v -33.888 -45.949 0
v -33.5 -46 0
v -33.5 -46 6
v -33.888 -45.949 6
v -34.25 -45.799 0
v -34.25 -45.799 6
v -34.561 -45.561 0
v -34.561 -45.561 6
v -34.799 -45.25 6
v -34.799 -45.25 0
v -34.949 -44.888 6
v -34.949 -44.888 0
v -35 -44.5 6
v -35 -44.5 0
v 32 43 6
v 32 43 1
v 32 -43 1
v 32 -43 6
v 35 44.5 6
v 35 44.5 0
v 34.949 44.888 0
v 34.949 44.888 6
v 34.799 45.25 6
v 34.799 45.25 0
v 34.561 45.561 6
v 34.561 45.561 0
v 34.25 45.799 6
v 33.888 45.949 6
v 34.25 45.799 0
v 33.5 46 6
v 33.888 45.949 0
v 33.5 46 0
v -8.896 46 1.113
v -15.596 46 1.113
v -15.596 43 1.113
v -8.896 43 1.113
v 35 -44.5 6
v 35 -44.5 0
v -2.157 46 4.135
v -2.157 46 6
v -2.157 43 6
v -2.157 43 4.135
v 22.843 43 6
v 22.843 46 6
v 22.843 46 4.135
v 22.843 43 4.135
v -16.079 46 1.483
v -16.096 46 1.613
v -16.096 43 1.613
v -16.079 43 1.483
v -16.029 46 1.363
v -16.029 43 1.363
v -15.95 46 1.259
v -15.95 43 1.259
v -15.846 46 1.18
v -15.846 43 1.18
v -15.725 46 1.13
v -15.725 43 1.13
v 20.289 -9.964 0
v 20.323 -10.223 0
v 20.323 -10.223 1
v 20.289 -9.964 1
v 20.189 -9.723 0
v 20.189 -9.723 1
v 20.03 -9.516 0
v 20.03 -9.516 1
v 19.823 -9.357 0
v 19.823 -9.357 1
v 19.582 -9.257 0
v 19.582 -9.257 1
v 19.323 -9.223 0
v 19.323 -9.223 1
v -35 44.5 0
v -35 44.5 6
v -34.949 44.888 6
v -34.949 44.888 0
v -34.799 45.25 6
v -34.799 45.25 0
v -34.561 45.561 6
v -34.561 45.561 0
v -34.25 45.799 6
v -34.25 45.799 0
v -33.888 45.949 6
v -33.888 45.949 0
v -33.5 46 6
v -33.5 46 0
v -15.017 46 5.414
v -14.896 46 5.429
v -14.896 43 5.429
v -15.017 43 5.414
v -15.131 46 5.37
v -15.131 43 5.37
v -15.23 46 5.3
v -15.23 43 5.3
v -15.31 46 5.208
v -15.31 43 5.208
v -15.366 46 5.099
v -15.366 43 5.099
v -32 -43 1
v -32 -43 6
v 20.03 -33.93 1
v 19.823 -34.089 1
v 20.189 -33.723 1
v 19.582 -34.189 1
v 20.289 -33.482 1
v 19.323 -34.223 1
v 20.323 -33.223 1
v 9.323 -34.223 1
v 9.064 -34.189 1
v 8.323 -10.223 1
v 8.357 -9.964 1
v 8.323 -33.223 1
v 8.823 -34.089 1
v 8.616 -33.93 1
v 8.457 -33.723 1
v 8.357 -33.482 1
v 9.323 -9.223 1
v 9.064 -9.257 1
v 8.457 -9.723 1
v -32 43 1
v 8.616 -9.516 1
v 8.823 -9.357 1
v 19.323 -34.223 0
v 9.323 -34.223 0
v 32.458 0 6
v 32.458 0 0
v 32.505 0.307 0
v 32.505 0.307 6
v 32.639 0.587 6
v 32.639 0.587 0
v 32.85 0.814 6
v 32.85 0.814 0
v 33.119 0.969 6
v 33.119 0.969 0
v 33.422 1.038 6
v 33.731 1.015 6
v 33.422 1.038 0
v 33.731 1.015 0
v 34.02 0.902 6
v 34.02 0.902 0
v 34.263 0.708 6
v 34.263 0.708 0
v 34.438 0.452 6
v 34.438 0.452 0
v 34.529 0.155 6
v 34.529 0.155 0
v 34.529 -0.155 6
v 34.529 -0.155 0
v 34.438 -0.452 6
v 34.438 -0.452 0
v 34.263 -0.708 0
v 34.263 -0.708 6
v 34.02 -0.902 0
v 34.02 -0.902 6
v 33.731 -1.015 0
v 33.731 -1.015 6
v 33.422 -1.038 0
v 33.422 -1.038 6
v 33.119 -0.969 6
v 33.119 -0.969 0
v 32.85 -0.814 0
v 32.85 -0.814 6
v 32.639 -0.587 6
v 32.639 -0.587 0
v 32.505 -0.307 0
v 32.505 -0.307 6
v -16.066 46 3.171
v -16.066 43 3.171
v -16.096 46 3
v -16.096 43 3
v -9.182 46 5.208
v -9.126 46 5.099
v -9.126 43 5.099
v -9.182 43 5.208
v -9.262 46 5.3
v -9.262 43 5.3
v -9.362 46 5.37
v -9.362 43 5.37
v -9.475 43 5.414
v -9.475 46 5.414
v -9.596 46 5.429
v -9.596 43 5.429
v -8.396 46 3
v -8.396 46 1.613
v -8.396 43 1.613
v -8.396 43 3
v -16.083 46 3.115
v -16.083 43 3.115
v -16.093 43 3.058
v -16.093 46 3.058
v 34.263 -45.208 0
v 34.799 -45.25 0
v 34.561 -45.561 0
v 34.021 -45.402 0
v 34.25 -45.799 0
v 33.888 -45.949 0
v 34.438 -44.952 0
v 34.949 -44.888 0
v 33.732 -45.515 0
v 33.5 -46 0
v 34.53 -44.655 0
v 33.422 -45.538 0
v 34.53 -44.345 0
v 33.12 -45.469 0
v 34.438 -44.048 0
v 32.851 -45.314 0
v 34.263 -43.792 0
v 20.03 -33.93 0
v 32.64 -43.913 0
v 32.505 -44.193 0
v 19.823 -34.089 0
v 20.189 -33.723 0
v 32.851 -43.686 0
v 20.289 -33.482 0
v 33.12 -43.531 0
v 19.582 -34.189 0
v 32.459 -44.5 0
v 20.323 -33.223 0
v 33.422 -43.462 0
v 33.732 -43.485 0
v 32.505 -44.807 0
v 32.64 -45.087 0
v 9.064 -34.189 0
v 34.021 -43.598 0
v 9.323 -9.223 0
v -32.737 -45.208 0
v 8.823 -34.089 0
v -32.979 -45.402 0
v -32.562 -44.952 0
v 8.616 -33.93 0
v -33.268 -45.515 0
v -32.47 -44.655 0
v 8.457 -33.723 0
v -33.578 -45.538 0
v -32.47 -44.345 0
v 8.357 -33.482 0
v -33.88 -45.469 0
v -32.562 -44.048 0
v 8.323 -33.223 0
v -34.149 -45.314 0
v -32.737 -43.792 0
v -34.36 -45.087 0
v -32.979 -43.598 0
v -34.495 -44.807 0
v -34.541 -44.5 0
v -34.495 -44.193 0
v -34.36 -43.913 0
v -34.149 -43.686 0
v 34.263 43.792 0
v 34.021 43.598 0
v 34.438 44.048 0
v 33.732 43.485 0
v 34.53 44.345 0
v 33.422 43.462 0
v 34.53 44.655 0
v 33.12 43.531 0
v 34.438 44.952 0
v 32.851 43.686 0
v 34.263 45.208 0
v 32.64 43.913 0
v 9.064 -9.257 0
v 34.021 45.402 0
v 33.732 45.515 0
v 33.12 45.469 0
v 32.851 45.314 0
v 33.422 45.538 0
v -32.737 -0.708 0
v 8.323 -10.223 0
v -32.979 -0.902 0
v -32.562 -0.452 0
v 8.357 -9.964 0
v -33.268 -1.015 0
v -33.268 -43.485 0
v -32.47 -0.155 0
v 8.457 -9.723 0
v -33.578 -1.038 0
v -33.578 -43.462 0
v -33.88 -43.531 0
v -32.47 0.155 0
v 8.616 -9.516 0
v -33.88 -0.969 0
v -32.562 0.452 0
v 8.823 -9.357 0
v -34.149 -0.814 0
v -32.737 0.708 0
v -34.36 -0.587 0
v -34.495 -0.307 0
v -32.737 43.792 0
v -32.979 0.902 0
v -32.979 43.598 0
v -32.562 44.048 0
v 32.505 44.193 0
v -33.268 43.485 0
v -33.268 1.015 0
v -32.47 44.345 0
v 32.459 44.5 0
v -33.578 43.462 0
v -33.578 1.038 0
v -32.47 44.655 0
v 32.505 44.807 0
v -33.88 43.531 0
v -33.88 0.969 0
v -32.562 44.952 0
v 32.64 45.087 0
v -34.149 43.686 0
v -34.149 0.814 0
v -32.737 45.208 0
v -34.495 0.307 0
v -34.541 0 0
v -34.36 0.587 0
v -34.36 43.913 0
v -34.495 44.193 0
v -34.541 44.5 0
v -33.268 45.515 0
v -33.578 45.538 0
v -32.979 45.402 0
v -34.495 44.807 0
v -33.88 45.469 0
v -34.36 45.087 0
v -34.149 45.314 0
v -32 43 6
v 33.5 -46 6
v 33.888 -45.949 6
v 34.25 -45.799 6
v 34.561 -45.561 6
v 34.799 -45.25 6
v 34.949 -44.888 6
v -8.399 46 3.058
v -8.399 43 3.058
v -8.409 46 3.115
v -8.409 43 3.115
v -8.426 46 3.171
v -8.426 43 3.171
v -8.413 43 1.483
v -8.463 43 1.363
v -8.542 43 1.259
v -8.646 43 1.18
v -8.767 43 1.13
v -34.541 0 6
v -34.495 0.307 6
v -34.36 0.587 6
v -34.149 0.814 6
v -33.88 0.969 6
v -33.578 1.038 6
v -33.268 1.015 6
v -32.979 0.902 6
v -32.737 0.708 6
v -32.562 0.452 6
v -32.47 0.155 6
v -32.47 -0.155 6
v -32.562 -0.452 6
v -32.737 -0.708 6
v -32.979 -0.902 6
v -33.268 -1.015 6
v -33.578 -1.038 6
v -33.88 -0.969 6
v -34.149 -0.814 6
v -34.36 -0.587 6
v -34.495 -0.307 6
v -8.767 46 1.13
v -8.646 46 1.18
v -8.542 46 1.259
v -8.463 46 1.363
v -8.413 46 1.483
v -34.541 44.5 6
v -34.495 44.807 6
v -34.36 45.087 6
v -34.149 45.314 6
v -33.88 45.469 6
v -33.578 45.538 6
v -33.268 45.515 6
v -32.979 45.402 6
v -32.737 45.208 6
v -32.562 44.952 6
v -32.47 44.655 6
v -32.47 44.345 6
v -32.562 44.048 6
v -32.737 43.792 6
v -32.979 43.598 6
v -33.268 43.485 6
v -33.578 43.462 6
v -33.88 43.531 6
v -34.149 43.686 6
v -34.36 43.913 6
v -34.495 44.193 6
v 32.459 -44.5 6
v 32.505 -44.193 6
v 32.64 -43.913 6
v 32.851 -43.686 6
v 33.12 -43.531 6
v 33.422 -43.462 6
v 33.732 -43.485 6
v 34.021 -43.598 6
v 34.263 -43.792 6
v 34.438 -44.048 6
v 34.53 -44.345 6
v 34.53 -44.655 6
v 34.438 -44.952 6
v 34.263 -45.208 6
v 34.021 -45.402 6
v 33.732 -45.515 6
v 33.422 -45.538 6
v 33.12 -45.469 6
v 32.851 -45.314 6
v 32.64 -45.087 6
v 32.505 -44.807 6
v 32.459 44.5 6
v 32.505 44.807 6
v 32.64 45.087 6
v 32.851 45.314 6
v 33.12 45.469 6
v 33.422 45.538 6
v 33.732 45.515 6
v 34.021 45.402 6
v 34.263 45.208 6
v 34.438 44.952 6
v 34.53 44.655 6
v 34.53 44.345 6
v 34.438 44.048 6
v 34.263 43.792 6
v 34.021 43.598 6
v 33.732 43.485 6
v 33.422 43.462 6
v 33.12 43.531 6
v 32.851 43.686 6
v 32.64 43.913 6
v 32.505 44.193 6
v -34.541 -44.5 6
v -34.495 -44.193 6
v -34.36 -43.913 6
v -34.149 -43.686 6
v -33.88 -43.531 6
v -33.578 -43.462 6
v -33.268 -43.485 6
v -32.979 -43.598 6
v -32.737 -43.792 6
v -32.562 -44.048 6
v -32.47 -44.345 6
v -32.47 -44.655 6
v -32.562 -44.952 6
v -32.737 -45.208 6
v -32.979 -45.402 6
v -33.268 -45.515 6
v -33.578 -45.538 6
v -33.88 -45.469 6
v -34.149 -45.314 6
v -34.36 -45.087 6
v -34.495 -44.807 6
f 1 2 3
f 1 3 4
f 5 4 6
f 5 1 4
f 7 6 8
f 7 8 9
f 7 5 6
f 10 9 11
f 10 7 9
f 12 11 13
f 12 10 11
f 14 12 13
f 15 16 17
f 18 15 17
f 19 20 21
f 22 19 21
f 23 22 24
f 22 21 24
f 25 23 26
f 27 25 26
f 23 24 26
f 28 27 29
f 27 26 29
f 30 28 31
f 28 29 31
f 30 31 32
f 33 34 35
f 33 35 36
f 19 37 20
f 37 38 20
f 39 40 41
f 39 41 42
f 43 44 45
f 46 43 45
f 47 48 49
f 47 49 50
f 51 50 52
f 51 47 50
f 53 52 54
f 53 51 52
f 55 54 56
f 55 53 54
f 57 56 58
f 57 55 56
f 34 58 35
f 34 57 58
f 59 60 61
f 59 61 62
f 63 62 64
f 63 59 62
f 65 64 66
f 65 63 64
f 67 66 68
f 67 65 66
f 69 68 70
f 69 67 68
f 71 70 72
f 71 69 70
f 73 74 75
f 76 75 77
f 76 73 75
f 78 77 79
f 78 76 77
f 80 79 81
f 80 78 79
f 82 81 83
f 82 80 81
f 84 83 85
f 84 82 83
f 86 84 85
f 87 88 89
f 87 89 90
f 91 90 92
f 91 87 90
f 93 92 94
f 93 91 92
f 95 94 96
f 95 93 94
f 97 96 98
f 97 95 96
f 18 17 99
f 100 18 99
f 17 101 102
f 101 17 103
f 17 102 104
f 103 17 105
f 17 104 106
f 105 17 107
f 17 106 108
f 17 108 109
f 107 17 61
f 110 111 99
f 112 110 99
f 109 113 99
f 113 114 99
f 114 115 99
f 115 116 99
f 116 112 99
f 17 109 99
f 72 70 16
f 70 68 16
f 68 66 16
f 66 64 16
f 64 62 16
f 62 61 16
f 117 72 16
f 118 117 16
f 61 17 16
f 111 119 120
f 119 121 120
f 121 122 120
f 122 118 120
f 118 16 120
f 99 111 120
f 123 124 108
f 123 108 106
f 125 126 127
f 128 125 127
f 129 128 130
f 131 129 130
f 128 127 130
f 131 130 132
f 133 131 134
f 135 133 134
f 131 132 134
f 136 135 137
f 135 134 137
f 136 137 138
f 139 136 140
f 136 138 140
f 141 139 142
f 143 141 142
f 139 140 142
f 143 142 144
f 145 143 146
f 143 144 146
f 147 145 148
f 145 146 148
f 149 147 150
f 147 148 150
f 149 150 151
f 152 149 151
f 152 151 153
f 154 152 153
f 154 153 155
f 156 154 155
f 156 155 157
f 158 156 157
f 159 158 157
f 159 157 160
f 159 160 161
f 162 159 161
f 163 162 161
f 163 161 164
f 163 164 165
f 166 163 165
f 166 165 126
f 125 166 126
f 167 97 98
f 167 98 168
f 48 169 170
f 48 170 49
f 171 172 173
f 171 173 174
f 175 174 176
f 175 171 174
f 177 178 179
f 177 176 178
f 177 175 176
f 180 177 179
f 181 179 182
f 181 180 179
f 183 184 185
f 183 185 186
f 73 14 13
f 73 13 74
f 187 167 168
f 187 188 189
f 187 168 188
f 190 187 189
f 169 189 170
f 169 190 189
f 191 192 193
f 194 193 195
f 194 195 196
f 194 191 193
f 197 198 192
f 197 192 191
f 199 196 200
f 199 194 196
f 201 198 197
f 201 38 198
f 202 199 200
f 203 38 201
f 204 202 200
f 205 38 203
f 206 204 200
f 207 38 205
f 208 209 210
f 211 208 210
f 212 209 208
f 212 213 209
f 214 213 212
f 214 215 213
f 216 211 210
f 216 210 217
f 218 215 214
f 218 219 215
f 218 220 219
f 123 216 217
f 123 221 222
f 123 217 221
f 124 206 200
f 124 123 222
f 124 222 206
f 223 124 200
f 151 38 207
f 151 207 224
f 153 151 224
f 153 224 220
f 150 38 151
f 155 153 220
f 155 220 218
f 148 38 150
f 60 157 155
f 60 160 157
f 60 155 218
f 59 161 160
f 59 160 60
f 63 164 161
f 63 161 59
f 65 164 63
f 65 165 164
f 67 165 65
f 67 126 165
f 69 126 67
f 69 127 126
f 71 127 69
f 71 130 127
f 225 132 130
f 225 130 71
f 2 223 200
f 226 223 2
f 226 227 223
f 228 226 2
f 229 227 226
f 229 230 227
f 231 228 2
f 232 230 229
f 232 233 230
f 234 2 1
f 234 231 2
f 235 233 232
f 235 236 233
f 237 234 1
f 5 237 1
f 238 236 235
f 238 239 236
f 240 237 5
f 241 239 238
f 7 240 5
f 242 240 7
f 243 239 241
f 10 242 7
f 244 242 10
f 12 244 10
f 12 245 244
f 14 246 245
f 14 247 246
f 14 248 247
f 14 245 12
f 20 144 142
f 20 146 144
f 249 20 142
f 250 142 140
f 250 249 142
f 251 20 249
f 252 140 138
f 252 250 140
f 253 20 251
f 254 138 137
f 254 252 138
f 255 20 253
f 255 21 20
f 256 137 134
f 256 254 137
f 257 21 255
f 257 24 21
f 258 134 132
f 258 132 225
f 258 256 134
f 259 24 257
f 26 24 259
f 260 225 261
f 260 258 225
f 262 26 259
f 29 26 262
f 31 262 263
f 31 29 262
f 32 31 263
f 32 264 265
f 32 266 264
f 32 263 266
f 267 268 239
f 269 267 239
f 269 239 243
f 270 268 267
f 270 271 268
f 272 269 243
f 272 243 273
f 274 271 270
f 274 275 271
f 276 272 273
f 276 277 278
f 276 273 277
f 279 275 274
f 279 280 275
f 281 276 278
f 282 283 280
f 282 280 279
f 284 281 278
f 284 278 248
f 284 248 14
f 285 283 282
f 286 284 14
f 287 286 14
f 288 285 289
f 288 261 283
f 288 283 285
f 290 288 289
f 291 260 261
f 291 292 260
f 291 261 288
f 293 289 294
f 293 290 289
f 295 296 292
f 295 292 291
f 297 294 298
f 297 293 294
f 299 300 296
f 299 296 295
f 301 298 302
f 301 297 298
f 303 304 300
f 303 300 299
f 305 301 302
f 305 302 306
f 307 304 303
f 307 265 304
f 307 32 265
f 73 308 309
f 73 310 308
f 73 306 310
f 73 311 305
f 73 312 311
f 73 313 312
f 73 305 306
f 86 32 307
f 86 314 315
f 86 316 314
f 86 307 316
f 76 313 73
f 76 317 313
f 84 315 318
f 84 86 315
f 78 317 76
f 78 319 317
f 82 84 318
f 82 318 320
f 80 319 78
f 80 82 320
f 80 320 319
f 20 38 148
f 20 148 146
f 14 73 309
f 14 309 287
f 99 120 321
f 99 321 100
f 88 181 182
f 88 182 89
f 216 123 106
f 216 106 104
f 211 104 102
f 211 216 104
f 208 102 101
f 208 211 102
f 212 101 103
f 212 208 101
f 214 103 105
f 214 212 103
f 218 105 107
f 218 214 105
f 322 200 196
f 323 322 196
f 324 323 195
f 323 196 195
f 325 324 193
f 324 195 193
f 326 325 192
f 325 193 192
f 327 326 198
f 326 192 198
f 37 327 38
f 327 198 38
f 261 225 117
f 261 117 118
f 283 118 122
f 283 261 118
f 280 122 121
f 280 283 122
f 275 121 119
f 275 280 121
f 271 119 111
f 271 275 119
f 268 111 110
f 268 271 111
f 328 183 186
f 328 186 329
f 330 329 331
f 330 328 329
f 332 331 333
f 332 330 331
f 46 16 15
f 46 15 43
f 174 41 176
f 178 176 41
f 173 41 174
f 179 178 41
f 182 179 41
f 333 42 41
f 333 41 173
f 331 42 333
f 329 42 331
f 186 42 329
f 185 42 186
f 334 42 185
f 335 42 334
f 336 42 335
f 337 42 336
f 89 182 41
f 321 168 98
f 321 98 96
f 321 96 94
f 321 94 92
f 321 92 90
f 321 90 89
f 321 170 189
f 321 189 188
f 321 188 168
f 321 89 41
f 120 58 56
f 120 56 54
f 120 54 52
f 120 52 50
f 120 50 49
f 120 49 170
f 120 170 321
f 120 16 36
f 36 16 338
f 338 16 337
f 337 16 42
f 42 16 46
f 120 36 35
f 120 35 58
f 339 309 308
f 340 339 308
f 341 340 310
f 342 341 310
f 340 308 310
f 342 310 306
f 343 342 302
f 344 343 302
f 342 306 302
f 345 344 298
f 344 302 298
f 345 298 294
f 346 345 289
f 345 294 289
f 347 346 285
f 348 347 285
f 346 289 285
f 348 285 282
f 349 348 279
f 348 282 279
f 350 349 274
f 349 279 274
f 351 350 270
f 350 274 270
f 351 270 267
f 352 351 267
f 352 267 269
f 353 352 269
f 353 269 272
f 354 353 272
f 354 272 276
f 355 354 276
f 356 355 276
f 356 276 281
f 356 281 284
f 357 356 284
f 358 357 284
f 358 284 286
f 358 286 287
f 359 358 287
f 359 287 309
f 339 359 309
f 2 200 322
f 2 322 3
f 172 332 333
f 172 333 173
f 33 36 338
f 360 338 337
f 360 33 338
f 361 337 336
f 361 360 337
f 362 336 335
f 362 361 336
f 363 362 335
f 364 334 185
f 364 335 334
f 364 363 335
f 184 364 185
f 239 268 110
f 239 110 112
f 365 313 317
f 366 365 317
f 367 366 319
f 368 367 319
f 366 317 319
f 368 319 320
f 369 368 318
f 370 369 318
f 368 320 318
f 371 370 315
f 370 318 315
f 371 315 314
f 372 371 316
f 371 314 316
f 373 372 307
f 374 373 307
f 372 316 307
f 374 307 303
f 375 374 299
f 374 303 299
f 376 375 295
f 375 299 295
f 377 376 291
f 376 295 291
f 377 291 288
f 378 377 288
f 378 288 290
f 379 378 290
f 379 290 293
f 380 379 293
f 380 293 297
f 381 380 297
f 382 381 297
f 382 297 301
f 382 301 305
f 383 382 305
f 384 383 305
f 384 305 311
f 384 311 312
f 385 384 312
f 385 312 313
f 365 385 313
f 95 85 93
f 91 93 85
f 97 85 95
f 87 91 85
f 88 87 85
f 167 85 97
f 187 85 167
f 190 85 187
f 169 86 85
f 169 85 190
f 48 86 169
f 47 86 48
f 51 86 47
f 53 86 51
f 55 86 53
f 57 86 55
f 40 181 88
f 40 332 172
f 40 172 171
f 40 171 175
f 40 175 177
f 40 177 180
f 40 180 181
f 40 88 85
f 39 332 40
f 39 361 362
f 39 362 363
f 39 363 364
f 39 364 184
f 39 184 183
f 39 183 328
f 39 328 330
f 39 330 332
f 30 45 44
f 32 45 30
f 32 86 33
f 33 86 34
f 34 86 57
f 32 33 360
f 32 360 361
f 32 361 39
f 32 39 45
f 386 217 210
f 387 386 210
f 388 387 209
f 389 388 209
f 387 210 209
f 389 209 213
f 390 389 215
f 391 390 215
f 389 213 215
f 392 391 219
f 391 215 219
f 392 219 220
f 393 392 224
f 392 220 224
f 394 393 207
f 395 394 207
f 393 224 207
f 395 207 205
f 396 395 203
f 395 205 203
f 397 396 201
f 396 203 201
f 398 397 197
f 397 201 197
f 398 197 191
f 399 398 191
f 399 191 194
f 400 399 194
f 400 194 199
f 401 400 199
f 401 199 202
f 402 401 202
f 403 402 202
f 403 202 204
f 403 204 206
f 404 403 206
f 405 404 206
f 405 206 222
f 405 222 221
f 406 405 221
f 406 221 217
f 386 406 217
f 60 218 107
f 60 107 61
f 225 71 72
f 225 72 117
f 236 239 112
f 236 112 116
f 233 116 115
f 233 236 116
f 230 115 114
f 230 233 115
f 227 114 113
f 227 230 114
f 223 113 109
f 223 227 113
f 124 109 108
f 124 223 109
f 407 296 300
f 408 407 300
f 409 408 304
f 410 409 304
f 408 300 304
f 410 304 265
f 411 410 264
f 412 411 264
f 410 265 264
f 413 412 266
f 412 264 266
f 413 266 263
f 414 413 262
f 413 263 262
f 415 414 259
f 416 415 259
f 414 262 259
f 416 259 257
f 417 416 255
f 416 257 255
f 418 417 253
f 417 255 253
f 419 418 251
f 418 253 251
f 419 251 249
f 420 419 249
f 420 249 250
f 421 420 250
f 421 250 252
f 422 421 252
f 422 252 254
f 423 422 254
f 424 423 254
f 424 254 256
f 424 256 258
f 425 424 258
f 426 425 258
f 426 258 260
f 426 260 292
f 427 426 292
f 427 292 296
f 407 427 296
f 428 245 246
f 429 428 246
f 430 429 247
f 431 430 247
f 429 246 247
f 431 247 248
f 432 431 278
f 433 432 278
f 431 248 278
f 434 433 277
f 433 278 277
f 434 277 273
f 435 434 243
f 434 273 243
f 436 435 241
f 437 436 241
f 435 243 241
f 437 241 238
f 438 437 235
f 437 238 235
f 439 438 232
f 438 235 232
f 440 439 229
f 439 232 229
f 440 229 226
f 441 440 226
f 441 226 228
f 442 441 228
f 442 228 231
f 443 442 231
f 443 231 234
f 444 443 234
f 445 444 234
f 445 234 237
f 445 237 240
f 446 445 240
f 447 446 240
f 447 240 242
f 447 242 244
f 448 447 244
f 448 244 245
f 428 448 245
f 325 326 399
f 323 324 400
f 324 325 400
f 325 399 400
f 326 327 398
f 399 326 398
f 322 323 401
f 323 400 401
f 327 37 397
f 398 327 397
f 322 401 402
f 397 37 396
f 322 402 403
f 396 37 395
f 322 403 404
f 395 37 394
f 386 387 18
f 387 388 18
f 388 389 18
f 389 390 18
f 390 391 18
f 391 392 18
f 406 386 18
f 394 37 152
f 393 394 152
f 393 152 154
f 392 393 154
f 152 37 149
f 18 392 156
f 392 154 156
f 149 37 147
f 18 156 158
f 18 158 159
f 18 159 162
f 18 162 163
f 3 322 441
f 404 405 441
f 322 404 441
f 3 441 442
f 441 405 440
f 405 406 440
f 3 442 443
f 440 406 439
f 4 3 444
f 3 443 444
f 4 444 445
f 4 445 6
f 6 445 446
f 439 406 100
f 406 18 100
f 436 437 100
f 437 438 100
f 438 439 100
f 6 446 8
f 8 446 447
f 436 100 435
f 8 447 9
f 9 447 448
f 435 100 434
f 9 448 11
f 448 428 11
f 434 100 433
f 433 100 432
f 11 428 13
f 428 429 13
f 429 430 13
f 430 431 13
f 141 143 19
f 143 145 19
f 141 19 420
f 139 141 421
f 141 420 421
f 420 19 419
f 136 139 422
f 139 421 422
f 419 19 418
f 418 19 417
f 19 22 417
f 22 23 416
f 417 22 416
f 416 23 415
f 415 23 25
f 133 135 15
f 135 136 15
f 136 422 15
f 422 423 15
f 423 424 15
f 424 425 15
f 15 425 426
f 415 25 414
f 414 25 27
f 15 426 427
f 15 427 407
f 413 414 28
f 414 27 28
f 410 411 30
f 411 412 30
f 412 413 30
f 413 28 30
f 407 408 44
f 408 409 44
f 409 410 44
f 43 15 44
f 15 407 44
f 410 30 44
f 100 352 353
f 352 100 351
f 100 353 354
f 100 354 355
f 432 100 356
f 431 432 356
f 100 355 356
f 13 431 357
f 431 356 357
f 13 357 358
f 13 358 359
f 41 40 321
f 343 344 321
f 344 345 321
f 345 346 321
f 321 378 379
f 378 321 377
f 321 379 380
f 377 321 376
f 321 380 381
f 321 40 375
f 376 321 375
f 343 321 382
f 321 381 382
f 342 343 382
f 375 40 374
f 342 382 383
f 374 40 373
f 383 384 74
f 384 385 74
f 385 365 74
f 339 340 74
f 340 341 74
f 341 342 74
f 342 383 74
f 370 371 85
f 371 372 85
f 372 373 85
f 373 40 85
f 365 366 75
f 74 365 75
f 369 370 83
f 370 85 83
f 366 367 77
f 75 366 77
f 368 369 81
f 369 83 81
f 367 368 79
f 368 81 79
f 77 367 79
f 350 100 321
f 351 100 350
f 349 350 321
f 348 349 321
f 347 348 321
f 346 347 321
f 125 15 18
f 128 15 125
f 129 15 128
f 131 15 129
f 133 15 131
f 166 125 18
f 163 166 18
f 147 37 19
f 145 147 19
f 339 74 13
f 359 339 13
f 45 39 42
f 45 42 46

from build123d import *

# Parameters (mm, degrees)
BOSS_EXTRUDE1_DEPTH       = 1
BOSS_EXTRUDE2_DEPTH       = 5
BOSS_EXTRUDE3_DEPTH       = 5
CUT_EXTRUDE3_DEPTH        = 10
CUT_EXTRUDE2_DEPTH        = 10
TAP_DRILL_FOR_3_56_TAP1_D = 2.0828
SKETCH29_W                = 25
SKETCH29_H                = 1.864988104
CUT_EXTRUDE4_DEPTH        = 10


with BuildPart() as part:
    # Sketch2 → Boss-Extrude1 (new body)
    with BuildSketch(Plane.XY):
        with BuildLine():
            Line((-33.5, 46), (33.5, 46))
            ThreePointArc((33.5, 46), (34.560660172, 45.560660172), (35, 44.5))
            Line((35, 44.5), (35, -44.5))
            ThreePointArc((35, -44.5), (34.560660172, -45.560660172), (33.5, -46))
            Line((33.5, -46), (-33.5, -46))
            ThreePointArc((-33.5, -46), (-34.560660172, -45.560660172), (-35, -44.5))
            Line((-35, -44.5), (-35, 44.5))
            ThreePointArc((-35, 44.5), (-34.560660172, 45.560660172), (-33.5, 46))
        make_face()
    extrude(amount=BOSS_EXTRUDE1_DEPTH)

    # Sketch3 → Boss-Extrude2 (add)
    with BuildSketch(Plane.XY.offset(1)):
        with BuildLine():
            Line((-32, 44.5), (-32, -44.5))
            ThreePointArc((-32, -44.5), (-33.5, -46), (-35, -44.5))
            Line((-35, -44.5), (-35, 44.5))
            ThreePointArc((-35, 44.5), (-33.5, 46), (-32, 44.5))
        make_face()
        with BuildLine():
            Line((32, 44.5), (32, -44.5))
            ThreePointArc((32, -44.5), (33.5, -46), (35, -44.5))
            Line((35, -44.5), (35, 44.5))
            ThreePointArc((35, 44.5), (33.5, 46), (32, 44.5))
        make_face()
    extrude(amount=BOSS_EXTRUDE2_DEPTH)

    # Sketch4 → Boss-Extrude3 (add)
    with BuildSketch(Plane.XY.offset(1)):
        with BuildLine():
            Line((-33.5, 46), (33.5, 46))
            ThreePointArc((33.5, 46), (35, 44.5), (33.5, 43))
            Line((33.5, 43), (-33.5, 43))
            ThreePointArc((-33.5, 43), (-35, 44.5), (-33.5, 46))
        make_face()
        with BuildLine():
            Line((-33.5, -46), (33.5, -46))
            ThreePointArc((33.5, -46), (35, -44.5), (33.5, -43))
            Line((33.5, -43), (-33.5, -43))
            ThreePointArc((-33.5, -43), (-35, -44.5), (-33.5, -46))
        make_face()
    extrude(amount=BOSS_EXTRUDE3_DEPTH)

    # Sketch5 → Cut-Extrude3 (cut)
    with BuildSketch(Plane(origin=(0, 46, 0), x_dir=(1, 0, 0), z_dir=(0, 1, 0))):
        with BuildLine():
            ThreePointArc((-14.89567412, -5.42869642), (-15.182613275, -5.338166714), (-15.36564636, -5.099360107))
            Line((-15.36564636, -5.099360107), (-16.066024836, -3.170663686))
            ThreePointArc((-16.066024836, -3.170663686), (-16.088488439, -3.0866426), (-16.096052596, -3))
            Line((-16.096052596, -3), (-16.096052596, -1.612708973))
            ThreePointArc((-16.096052596, -1.612708973), (-15.949605986, -1.259155582), (-15.596052596, -1.112708973))
            Line((-15.596052596, -1.112708973), (-8.896052596, -1.112708973))
            ThreePointArc((-8.896052596, -1.112708973), (-8.542499205, -1.259155582), (-8.396052596, -1.612708973))
            Line((-8.396052596, -1.612708973), (-8.396052596, -3))
            ThreePointArc((-8.396052596, -3), (-8.403616752, -3.0866426), (-8.426080356, -3.170663686))
            Line((-8.426080356, -3.170663686), (-9.126458831, -5.099360107))
            ThreePointArc((-9.126458831, -5.099360107), (-9.309491917, -5.338166714), (-9.596431071, -5.42869642))
            Line((-9.596431071, -5.42869642), (-14.89567412, -5.42869642))
        make_face()
    extrude(amount=-CUT_EXTRUDE3_DEPTH, mode=Mode.SUBTRACT)

    # Sketch7 → Cut-Extrude2 (cut)
    with BuildSketch(Plane(origin=(0, 0, 0), x_dir=(-1, 0, 0), z_dir=(0, 0, -1))):
        with BuildLine():
            Line((-19.322853535, -9.222931336), (-9.322853535, -9.222931336))
            ThreePointArc((-9.322853535, -9.222931336), (-8.615746754, -9.515824554), (-8.322853535, -10.222931336))
            Line((-8.322853535, -10.222931336), (-8.322853535, -33.222931336))
            ThreePointArc((-8.322853535, -33.222931336), (-8.615746754, -33.930038117), (-9.322853535, -34.222931336))
            Line((-9.322853535, -34.222931336), (-19.322853535, -34.222931336))
            ThreePointArc((-19.322853535, -34.222931336), (-20.029960316, -33.930038117), (-20.322853535, -33.222931336))
            Line((-20.322853535, -33.222931336), (-20.322853535, -10.222931336))
            ThreePointArc((-20.322853535, -10.222931336), (-20.029960316, -9.515824554), (-19.322853535, -9.222931336))
        make_face()
    extrude(amount=-CUT_EXTRUDE2_DEPTH, mode=Mode.SUBTRACT)

    # Tap Drill for #3-56 Tap1 (through all)
    with Locations(Plane.XY.offset(6)):
        with Locations((-33.5, 44.5), (-33.5, 0), (-33.5, -44.5), (33.5, -44.5), (33.499705774, 0), (33.5, 44.5)):
            Hole(TAP_DRILL_FOR_3_56_TAP1_D / 2)

    # Sketch29 → Cut-Extrude4 (cut)
    with BuildSketch(Plane(origin=(0, 46, 0), x_dir=(1, 0, 0), z_dir=(0, 1, 0))):
        with Locations((10.342588325, -5.067505948)):
            Rectangle(SKETCH29_W, SKETCH29_H)
    extrude(amount=-CUT_EXTRUDE4_DEPTH, mode=Mode.SUBTRACT)


solid = part.part
